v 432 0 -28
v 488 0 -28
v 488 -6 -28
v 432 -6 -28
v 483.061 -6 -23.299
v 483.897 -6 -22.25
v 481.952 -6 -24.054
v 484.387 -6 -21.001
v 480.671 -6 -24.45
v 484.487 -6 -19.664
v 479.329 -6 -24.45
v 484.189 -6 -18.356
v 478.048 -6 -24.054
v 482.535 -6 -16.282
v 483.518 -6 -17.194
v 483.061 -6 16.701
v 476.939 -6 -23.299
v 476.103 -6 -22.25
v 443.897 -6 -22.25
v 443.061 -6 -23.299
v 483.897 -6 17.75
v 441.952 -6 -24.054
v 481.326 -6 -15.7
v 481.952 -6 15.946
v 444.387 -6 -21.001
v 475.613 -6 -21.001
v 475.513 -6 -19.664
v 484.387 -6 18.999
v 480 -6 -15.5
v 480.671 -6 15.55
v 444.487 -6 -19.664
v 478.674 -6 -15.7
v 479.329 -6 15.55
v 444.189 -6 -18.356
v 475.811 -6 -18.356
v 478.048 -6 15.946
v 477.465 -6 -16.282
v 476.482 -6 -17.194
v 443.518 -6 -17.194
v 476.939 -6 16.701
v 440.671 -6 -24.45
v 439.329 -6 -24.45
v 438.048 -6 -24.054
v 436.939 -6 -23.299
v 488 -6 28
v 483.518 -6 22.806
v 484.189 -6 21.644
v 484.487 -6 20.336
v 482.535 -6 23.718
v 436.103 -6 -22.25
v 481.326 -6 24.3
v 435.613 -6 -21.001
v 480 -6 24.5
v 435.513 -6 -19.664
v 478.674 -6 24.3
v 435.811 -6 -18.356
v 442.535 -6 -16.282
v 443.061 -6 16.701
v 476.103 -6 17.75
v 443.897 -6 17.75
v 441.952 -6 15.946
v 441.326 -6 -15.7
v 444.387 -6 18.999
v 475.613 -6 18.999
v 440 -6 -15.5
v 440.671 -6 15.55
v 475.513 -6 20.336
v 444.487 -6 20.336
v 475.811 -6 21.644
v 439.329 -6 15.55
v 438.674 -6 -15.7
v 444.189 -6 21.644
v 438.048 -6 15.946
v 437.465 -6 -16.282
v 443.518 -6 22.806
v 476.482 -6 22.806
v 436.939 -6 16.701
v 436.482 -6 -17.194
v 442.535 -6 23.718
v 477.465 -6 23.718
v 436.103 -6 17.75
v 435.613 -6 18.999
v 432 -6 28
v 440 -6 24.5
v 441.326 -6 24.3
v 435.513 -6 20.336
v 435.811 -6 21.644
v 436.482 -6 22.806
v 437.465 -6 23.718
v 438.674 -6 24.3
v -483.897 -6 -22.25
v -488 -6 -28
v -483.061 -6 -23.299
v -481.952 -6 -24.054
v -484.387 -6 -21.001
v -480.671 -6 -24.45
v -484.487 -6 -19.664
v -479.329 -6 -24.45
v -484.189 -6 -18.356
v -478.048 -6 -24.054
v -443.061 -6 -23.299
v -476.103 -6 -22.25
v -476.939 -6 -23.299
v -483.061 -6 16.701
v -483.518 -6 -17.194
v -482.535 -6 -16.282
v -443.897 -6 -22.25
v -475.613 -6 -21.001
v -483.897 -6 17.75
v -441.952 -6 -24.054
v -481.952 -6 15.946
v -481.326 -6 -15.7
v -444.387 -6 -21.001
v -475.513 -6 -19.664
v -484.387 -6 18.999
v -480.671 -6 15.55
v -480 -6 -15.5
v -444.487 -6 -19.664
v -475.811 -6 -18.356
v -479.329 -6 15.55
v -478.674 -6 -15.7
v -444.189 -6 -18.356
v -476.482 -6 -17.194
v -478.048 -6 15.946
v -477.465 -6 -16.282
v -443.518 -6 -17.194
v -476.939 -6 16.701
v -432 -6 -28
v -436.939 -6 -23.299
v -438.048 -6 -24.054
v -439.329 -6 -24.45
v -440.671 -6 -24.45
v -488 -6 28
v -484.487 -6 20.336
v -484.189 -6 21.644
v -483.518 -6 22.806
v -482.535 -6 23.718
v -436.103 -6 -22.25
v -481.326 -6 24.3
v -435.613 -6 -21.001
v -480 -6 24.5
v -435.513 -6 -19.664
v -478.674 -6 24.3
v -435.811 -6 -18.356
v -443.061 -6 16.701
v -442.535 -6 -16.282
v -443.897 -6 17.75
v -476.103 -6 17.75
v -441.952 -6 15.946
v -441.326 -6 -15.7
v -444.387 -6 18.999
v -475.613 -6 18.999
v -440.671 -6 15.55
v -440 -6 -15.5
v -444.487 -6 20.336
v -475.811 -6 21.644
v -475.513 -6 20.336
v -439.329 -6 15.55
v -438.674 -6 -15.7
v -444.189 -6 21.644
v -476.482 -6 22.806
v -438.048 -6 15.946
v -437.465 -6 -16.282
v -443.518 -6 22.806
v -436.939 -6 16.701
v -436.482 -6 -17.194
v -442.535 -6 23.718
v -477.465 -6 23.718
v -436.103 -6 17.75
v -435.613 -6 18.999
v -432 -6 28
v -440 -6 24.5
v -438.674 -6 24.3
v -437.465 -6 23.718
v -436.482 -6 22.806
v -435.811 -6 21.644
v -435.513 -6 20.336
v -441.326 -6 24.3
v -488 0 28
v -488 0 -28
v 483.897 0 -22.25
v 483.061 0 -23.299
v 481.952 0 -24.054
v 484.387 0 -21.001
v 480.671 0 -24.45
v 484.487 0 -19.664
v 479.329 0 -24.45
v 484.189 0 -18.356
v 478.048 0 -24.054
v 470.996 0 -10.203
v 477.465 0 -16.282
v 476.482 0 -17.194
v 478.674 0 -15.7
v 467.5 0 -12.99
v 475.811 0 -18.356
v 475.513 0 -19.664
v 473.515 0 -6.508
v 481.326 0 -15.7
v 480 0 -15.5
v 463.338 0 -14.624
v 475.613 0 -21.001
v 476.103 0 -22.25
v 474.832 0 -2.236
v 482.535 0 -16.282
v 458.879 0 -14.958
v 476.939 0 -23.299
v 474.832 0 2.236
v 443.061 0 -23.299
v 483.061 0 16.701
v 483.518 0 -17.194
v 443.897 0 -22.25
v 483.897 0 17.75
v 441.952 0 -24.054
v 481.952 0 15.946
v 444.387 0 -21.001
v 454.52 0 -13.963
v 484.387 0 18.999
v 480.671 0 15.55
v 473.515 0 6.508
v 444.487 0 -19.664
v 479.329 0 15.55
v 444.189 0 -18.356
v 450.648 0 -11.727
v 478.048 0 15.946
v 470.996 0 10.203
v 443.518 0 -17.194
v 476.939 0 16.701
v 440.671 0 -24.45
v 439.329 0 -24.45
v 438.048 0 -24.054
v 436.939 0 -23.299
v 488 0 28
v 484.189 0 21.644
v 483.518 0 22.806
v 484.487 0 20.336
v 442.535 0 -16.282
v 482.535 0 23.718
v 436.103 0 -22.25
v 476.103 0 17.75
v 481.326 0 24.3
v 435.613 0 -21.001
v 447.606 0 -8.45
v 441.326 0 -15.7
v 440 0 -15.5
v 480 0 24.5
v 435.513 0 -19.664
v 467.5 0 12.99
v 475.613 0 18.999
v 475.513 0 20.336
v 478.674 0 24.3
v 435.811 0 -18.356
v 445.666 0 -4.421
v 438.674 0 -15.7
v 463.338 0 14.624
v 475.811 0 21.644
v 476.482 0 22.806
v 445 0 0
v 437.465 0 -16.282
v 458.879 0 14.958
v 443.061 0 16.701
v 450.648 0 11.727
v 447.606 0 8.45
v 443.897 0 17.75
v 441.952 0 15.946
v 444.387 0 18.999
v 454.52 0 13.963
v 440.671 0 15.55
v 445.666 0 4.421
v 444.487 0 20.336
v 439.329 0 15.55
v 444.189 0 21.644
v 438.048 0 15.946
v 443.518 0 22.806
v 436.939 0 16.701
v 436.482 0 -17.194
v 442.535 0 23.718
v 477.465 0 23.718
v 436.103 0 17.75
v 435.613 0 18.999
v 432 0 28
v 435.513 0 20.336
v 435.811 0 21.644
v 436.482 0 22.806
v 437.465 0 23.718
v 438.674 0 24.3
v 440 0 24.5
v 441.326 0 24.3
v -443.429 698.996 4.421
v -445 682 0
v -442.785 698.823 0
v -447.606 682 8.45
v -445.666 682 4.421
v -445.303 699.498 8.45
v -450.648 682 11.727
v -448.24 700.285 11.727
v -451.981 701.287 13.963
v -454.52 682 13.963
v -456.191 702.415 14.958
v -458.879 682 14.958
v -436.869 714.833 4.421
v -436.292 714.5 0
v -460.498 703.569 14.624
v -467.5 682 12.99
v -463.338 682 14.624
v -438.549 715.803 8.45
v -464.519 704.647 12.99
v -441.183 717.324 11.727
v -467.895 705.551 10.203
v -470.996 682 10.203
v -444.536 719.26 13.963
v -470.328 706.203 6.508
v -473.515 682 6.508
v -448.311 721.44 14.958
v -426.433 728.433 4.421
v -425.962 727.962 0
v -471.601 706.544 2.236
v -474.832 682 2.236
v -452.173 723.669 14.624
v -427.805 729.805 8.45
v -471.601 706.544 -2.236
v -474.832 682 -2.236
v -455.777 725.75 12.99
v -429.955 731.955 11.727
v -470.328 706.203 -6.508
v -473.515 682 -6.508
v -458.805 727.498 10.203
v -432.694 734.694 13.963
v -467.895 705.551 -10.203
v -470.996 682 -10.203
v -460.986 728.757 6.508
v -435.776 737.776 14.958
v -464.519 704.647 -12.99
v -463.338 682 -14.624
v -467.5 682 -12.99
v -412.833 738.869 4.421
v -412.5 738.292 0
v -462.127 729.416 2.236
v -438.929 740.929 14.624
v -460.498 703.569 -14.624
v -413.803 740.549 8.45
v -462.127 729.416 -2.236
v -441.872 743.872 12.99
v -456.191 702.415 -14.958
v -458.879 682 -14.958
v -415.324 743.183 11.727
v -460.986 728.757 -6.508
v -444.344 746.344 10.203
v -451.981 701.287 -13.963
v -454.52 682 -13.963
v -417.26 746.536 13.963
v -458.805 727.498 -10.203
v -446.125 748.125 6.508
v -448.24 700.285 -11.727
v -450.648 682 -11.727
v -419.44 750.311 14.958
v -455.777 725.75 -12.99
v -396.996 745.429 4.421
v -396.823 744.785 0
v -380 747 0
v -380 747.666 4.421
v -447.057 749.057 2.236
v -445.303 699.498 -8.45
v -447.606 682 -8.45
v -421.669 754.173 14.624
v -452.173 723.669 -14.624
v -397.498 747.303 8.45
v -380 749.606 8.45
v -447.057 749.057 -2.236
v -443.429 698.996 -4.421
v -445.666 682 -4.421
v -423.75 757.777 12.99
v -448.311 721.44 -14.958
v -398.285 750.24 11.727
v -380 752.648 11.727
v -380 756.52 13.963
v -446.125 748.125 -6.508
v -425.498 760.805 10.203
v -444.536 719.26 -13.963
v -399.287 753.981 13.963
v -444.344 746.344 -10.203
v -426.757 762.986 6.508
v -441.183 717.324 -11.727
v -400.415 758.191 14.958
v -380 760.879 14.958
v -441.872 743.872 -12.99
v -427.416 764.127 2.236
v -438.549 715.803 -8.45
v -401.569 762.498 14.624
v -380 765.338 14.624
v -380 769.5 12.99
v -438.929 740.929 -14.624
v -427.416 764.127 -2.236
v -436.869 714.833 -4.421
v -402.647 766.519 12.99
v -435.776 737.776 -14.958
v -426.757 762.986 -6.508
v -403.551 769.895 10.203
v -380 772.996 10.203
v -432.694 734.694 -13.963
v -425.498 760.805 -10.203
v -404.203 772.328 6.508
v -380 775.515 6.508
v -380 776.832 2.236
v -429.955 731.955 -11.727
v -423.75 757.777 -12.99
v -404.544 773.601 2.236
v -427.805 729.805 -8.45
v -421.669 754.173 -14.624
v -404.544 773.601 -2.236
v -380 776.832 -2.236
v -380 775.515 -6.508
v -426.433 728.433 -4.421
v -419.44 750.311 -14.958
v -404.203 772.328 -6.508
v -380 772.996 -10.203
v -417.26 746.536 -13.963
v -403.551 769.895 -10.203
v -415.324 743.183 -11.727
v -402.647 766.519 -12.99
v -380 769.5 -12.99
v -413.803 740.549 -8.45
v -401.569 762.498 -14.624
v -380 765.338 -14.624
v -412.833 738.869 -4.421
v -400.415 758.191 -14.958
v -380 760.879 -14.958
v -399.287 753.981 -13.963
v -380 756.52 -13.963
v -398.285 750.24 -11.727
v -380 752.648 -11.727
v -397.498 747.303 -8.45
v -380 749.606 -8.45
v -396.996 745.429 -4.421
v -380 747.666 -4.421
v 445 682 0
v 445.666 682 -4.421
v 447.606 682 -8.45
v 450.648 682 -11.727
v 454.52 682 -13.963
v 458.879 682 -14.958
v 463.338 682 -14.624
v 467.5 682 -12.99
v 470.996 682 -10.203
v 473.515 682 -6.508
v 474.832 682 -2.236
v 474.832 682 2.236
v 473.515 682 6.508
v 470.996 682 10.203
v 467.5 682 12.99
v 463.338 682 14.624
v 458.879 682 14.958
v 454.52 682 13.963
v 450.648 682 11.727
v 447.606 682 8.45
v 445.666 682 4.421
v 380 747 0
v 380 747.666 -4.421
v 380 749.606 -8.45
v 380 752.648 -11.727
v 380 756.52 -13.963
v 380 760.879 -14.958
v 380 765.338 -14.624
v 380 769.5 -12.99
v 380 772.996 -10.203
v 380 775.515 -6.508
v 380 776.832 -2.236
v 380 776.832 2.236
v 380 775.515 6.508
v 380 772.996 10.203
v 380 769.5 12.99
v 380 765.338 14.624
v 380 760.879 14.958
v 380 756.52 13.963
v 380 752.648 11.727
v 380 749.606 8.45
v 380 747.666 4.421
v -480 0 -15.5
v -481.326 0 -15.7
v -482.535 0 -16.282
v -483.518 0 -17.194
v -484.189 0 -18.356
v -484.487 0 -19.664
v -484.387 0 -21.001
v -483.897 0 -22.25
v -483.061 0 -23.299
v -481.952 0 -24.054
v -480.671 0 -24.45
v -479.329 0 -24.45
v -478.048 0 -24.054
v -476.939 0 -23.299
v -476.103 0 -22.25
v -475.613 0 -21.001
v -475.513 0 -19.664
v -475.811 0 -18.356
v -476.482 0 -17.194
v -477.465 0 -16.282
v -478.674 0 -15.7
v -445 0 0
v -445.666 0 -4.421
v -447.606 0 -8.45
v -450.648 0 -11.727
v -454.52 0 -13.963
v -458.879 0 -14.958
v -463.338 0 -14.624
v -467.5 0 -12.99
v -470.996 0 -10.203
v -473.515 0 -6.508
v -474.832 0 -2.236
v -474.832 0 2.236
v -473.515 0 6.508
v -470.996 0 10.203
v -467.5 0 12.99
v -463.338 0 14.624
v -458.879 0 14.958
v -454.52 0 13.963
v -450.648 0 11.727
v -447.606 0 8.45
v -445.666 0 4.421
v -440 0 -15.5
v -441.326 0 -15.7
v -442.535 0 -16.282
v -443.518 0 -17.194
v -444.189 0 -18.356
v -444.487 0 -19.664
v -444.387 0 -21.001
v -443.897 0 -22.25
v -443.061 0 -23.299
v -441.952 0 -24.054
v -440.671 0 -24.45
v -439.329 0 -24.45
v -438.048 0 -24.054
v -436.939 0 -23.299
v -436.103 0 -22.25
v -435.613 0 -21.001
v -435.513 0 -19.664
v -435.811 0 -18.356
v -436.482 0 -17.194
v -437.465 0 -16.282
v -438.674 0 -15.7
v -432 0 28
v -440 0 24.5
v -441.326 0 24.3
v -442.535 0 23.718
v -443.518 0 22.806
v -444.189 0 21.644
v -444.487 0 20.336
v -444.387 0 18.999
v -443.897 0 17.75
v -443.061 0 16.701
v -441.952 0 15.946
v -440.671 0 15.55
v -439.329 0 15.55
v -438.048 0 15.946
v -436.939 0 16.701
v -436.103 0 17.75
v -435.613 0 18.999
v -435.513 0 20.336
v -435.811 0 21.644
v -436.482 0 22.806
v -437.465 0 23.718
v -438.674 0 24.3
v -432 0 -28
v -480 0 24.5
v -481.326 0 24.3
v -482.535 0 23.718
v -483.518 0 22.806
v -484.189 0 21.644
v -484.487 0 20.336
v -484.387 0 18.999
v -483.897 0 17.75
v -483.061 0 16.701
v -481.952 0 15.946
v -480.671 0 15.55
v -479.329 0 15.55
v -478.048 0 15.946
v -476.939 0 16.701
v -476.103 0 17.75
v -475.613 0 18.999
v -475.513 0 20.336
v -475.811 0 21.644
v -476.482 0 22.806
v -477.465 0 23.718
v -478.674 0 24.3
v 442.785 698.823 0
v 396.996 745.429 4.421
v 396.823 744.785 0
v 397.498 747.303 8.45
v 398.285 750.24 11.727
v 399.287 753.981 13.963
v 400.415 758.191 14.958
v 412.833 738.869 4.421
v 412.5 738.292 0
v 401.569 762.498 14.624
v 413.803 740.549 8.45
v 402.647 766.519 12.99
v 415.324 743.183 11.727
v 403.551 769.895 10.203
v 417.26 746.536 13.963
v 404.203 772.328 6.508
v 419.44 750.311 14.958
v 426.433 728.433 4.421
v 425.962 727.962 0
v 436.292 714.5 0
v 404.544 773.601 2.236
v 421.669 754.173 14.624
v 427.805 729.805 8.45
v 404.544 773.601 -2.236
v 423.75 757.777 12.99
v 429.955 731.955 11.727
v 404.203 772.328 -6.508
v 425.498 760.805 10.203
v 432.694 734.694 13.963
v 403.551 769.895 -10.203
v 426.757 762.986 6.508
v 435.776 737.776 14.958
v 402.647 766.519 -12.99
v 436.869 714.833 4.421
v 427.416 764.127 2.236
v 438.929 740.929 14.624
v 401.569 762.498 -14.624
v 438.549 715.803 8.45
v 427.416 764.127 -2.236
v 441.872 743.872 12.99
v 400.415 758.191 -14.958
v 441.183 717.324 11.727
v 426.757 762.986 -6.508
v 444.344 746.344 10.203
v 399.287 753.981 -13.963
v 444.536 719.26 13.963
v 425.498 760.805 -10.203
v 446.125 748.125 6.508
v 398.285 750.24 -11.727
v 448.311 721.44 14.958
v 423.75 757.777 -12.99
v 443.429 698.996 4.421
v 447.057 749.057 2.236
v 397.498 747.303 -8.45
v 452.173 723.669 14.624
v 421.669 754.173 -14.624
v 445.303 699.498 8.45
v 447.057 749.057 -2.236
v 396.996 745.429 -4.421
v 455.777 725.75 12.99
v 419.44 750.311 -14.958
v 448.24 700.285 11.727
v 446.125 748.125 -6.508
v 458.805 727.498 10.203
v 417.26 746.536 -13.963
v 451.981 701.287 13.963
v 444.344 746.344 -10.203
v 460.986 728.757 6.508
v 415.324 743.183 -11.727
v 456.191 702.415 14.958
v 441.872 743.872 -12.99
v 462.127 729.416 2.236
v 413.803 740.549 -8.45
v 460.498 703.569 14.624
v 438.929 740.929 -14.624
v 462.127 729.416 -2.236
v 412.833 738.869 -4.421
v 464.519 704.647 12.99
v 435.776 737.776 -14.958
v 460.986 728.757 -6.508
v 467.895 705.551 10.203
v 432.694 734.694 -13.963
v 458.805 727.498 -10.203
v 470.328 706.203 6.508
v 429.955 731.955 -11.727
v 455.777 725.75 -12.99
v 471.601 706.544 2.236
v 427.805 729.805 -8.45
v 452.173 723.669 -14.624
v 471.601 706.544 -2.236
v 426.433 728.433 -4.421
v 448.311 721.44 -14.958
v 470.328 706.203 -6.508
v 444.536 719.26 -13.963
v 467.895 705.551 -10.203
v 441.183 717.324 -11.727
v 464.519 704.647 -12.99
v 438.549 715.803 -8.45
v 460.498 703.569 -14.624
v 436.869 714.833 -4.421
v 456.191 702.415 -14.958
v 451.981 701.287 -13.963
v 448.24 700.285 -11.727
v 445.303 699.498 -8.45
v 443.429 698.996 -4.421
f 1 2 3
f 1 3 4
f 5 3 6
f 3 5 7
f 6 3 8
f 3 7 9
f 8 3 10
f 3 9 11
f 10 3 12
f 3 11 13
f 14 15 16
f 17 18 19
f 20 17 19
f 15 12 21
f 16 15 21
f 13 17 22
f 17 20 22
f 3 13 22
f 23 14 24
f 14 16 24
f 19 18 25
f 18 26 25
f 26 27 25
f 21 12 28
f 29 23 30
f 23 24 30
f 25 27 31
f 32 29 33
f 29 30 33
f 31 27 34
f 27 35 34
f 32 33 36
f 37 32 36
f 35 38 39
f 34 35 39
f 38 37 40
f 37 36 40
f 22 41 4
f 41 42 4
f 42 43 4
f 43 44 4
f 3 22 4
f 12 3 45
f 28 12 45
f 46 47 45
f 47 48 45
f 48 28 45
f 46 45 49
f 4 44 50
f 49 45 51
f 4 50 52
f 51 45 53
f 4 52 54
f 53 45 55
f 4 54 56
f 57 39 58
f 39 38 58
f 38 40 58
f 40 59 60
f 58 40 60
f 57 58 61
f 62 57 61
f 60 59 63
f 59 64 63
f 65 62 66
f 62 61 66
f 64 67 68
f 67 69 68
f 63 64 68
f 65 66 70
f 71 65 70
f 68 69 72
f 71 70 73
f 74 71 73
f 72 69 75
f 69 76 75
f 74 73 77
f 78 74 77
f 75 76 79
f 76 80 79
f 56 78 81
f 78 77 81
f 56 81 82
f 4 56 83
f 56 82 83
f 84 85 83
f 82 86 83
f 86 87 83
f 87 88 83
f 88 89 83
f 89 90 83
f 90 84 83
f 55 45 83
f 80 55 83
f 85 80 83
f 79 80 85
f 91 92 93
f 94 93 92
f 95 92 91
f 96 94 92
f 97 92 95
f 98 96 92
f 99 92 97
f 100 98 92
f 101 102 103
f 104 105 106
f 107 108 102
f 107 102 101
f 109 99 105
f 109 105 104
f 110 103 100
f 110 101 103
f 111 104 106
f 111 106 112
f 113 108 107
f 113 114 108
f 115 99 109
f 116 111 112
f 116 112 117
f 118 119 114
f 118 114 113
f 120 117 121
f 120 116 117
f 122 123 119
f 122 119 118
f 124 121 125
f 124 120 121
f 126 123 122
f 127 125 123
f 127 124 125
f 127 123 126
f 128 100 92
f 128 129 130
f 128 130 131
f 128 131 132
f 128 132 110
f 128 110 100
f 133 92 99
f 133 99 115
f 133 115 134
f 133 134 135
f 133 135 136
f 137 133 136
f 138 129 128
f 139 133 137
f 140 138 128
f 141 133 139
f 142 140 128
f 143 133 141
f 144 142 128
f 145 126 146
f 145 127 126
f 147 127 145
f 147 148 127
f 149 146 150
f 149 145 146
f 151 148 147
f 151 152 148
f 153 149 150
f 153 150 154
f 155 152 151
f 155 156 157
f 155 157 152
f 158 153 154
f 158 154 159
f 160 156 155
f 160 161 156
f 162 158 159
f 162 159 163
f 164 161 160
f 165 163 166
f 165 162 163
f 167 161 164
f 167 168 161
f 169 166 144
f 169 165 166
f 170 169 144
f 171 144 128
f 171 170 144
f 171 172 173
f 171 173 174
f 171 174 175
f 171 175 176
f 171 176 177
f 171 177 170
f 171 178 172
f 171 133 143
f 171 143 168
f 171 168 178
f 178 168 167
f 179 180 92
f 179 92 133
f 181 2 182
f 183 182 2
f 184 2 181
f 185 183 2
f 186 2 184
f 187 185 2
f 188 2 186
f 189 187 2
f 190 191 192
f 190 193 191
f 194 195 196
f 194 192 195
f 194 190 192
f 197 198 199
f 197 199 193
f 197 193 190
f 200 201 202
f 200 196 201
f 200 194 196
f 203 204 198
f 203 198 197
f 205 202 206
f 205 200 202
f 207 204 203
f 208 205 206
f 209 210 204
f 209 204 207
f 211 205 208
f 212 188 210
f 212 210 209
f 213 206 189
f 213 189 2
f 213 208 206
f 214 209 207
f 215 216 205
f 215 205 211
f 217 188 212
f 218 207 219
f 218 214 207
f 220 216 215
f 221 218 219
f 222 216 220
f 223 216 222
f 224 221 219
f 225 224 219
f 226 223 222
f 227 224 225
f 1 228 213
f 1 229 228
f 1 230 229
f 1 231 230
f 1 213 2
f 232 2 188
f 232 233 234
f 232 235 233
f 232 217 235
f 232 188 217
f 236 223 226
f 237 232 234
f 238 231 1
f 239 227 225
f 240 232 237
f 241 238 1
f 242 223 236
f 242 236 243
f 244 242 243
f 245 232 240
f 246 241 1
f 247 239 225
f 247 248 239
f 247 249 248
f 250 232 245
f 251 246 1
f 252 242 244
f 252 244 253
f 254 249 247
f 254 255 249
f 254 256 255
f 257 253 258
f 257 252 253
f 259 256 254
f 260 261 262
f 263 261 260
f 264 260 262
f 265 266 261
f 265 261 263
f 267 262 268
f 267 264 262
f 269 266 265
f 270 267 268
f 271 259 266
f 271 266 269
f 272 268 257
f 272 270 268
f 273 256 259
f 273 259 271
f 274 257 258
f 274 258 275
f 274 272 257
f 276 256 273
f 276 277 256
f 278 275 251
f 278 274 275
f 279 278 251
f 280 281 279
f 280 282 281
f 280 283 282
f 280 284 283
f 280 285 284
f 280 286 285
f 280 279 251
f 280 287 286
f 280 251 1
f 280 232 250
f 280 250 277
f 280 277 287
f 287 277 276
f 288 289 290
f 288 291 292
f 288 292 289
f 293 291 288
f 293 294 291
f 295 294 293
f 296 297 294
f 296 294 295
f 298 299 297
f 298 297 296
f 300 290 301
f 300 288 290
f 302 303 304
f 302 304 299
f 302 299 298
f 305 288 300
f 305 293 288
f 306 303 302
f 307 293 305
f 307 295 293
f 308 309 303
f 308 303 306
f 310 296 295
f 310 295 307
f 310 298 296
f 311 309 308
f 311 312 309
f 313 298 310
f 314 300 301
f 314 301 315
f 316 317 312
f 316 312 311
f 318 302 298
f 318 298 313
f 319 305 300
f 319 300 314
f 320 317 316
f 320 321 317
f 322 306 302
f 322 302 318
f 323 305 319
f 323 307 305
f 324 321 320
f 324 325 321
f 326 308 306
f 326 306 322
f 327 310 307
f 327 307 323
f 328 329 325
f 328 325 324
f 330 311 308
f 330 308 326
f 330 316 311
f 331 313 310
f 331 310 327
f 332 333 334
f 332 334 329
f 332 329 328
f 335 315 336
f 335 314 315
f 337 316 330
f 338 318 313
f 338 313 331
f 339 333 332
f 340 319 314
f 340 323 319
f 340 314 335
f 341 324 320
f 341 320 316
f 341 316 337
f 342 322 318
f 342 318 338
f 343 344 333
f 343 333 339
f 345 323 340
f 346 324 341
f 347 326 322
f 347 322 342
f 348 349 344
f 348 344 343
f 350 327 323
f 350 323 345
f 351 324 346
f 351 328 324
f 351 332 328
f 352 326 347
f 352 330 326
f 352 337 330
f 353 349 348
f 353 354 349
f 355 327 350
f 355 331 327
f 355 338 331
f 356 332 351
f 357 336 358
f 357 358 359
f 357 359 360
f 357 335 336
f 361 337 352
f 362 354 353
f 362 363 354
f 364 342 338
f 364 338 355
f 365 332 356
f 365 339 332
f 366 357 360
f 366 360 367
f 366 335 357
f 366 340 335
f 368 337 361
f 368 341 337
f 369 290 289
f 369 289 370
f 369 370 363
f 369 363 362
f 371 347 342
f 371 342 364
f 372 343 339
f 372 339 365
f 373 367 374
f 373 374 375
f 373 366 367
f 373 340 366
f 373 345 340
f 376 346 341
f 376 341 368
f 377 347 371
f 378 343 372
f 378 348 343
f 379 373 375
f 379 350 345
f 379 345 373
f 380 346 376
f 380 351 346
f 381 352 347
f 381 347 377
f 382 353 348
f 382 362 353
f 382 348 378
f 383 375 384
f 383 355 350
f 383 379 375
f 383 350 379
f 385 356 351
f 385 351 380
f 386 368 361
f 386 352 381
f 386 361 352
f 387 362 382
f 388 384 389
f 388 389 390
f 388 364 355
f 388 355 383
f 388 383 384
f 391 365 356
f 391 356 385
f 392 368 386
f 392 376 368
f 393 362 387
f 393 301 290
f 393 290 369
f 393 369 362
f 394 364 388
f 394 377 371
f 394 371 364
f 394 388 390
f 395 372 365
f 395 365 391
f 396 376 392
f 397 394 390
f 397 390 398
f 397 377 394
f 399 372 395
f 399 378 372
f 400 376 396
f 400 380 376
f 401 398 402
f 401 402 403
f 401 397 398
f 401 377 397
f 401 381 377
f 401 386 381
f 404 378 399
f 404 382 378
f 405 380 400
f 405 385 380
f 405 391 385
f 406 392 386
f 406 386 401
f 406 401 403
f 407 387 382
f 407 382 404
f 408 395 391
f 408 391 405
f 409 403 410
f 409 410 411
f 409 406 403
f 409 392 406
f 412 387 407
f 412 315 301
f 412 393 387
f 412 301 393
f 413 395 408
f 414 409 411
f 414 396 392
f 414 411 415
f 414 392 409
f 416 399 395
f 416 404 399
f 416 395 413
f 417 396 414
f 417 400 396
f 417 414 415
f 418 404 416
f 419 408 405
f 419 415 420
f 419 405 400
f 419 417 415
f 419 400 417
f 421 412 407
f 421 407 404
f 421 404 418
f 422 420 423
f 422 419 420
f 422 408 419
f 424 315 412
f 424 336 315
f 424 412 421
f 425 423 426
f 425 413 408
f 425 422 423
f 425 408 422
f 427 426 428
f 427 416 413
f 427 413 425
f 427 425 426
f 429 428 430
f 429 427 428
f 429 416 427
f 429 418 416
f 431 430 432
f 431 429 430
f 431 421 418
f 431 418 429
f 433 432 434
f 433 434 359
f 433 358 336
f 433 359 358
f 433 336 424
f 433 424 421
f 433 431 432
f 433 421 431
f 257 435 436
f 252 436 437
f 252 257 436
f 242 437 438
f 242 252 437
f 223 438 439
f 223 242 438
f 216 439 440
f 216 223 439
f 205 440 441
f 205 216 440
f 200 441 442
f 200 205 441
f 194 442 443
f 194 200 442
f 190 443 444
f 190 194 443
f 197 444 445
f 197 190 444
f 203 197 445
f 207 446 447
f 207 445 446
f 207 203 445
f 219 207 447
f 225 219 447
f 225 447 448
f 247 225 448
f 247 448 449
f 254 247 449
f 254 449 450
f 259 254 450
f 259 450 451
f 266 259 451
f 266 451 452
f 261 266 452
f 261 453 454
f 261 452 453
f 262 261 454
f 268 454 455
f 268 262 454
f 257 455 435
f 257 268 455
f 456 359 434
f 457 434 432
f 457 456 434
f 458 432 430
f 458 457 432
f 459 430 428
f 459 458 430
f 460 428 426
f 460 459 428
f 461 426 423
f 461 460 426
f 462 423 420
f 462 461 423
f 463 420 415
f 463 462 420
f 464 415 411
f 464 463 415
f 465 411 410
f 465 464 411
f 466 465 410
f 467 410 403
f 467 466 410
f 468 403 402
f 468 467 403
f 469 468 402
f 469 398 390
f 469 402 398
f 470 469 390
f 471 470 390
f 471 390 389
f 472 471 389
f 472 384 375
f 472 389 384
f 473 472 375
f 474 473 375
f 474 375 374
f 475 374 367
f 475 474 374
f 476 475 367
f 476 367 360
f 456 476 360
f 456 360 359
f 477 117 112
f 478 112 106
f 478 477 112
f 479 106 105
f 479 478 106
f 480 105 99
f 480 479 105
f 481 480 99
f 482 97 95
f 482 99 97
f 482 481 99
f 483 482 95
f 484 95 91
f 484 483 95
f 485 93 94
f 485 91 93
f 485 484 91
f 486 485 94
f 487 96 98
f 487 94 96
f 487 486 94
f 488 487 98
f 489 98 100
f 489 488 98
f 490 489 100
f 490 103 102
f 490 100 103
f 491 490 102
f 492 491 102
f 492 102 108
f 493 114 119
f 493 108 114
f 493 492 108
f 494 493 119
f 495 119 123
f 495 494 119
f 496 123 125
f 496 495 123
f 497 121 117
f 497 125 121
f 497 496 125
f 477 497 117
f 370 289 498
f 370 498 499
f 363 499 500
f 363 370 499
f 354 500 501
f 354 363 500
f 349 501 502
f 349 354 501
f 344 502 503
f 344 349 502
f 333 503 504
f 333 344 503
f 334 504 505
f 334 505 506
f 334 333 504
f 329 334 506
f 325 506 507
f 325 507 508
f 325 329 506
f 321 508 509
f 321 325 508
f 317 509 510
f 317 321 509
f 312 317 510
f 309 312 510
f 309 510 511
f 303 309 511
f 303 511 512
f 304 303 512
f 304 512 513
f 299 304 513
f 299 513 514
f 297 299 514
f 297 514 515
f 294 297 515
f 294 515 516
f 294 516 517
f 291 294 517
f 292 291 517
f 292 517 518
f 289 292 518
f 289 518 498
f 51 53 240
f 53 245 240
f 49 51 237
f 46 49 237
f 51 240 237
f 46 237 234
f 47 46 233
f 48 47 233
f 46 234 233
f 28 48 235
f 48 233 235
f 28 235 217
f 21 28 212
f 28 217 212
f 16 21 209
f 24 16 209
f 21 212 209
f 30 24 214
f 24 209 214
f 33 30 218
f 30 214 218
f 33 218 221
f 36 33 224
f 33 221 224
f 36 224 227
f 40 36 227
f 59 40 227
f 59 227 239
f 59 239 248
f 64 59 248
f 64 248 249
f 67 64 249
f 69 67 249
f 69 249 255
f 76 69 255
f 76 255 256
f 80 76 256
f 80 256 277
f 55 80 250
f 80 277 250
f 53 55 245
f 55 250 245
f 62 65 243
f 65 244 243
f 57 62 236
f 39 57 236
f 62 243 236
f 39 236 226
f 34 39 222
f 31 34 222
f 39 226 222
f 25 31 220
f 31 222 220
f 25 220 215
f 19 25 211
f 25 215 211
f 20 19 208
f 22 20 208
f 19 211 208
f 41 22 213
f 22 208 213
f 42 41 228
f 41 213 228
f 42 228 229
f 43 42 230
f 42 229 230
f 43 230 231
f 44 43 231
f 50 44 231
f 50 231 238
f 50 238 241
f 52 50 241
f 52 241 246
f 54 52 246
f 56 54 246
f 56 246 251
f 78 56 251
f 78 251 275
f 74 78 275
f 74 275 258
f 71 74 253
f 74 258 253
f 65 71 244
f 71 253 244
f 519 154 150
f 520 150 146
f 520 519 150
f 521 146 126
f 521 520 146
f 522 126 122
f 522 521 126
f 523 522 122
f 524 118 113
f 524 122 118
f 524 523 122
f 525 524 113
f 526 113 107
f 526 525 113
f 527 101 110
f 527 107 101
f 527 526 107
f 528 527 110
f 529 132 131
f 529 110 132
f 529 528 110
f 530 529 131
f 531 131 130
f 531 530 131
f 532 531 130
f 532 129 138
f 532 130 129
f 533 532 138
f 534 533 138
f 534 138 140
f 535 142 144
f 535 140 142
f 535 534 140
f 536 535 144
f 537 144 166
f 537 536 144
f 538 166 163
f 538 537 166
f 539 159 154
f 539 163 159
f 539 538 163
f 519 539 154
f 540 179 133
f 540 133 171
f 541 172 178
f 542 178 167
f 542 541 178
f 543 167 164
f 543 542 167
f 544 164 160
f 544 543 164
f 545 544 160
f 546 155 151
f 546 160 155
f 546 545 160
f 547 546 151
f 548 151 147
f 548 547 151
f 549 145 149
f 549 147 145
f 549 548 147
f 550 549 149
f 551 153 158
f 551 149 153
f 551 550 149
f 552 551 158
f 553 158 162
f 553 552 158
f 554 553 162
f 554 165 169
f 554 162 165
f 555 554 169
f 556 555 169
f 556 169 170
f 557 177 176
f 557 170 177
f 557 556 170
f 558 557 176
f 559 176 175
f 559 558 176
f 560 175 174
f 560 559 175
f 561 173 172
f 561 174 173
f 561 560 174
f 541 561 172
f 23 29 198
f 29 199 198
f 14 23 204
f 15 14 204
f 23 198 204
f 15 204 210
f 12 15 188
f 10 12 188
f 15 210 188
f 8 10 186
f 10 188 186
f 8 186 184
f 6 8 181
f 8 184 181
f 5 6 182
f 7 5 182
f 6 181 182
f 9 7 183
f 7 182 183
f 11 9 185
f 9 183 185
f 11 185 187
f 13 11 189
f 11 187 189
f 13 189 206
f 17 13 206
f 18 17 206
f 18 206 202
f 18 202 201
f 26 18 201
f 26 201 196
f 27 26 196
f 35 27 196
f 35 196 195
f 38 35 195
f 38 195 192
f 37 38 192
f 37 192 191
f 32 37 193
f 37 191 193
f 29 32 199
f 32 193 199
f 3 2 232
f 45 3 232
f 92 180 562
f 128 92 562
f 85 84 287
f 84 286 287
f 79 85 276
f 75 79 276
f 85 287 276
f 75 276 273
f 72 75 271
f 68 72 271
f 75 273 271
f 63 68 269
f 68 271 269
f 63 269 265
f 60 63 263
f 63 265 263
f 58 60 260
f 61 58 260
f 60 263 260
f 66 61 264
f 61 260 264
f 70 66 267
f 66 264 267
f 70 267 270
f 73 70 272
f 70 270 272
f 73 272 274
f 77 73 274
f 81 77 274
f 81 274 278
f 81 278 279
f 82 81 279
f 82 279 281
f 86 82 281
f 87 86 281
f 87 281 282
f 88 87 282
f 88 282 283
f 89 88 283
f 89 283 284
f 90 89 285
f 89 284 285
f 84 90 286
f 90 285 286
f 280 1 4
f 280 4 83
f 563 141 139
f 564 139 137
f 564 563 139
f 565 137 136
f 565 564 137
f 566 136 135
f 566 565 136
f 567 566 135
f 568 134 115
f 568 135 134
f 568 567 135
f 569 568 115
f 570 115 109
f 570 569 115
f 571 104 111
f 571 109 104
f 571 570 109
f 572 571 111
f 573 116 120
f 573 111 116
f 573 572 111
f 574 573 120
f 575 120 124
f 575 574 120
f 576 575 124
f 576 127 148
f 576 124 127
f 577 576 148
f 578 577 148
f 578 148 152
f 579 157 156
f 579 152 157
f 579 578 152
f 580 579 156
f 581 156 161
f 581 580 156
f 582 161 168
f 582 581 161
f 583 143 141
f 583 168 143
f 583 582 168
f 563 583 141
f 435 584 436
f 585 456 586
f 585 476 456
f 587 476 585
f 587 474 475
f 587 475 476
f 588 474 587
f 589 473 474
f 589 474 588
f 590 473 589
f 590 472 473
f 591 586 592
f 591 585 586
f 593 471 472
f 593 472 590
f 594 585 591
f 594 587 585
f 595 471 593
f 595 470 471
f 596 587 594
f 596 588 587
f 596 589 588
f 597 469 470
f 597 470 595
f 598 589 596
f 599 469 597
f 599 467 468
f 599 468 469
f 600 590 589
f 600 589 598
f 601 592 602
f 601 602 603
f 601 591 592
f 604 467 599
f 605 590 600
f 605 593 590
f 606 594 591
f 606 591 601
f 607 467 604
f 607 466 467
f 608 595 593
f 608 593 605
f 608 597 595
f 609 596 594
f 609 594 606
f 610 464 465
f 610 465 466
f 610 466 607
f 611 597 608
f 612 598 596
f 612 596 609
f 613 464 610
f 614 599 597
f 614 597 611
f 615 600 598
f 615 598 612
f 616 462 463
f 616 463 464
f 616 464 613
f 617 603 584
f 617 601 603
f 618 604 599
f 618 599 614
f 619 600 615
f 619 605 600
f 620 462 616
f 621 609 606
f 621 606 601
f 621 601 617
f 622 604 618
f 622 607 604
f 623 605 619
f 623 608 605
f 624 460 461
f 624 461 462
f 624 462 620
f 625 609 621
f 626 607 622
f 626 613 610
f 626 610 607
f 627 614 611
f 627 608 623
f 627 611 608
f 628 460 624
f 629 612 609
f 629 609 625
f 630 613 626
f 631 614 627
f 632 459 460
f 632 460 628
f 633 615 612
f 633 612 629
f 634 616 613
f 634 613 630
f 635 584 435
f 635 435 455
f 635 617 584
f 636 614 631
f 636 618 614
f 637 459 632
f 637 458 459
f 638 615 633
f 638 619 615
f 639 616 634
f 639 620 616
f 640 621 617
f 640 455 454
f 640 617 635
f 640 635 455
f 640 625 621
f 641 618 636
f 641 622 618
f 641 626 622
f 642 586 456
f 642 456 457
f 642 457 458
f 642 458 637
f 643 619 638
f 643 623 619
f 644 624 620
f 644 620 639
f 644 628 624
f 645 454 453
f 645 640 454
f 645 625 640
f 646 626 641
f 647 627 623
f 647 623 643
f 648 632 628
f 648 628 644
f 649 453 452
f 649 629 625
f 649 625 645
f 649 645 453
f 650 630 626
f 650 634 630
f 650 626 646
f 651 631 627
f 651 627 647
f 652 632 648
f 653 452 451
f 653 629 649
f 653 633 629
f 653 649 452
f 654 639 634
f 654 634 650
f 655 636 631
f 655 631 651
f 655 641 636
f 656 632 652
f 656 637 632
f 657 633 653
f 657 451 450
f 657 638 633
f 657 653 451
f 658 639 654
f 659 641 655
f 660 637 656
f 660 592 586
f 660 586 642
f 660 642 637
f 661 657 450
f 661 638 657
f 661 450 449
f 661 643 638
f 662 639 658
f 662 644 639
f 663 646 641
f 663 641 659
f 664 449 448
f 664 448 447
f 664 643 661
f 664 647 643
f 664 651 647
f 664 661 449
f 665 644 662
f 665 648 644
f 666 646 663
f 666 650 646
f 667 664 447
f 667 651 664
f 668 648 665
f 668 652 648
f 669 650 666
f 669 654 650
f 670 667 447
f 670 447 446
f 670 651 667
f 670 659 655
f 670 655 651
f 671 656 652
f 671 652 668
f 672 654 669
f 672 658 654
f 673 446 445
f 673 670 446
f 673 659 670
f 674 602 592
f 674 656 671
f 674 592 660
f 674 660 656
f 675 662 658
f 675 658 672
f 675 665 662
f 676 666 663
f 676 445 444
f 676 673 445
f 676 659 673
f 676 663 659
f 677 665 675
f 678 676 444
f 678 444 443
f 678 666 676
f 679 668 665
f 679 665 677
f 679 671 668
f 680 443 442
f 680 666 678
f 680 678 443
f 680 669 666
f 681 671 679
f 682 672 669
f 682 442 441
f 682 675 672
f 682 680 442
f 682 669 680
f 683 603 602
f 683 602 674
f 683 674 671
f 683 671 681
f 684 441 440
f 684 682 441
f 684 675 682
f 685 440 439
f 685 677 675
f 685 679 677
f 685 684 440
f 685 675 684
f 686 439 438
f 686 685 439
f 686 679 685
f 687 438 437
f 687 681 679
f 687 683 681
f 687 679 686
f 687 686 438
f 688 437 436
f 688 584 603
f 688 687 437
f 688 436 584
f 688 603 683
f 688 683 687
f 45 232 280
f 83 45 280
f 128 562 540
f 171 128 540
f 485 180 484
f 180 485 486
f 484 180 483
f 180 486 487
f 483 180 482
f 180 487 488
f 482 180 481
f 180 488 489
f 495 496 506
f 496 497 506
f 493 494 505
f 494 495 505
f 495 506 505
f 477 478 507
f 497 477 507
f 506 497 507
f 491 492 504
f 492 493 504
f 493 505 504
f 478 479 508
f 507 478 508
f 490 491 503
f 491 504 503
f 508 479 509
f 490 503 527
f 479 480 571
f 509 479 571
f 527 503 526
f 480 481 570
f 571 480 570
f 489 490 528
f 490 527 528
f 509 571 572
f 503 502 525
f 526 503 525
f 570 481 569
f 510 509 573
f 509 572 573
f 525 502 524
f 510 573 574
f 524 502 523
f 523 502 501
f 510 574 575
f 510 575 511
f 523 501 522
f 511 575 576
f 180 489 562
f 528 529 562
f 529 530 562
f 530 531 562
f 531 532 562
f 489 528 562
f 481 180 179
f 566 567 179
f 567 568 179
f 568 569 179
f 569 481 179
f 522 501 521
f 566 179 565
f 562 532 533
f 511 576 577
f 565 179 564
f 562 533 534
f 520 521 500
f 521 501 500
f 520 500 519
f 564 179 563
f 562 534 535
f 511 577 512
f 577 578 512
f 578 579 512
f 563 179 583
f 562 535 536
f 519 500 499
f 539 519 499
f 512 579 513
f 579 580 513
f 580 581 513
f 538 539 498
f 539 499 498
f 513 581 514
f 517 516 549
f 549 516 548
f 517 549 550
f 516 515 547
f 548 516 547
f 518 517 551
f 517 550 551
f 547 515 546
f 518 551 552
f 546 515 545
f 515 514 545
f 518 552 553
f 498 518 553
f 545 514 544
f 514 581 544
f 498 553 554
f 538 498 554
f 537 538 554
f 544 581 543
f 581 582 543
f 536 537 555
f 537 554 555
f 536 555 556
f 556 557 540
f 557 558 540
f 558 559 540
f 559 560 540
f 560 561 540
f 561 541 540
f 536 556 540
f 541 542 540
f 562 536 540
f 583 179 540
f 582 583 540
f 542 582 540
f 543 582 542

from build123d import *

# Parameters (mm, degrees)
SKETCH2_R                     = 15
SKETCH3_W                     = 56
SKETCH3_H                     = 56
BOSS_EXTRUDE1_DEPTH           = 6
M8_CLEARANCE_HOLE1_AT_2_COUNT = 2
M8_CLEARANCE_HOLE1_AT_2_PITCH = 56.568542495
M8_CLEARANCE_HOLE1_AT_3_COUNT = 2
M8_CLEARANCE_HOLE1_AT_3_PITCH = 40
M8_CLEARANCE_HOLE1_AT_4_COUNT = 2
M8_CLEARANCE_HOLE1_AT_4_PITCH = 40


with BuildPart() as part:
    # Sweep1: sweep along a path in Sketch1
    with BuildLine(Plane.XY) as sweep1_path:
        Line((-460, 0), (-460, 682))
        ThreePointArc((-460, 682), (-436.568542495, 738.568542495), (-380, 762))
        Line((-380, 762), (380, 762))
        ThreePointArc((380, 762), (436.568542495, 738.568542495), (460, 682))
        Line((460, 682), (460, 0))
    # Sketch2 → Sweep1 (sweep)
    with BuildSketch(Plane(origin=(0, 0, 0), x_dir=(1, 0, 0), z_dir=(0, 1, 0))):
        with Locations((-460, 0)):
            Circle(SKETCH2_R)
    sweep(path=sweep1_path.line)

    # Sketch3 → Boss-Extrude1 (add)
    with BuildSketch(Plane.XZ):
        with Locations((-460, 0)):
            Rectangle(SKETCH3_W, SKETCH3_H)
    boss_extrude1 = extrude(amount=BOSS_EXTRUDE1_DEPTH)

    # Sketch7 → M8 Clearance Hole1 (revolve, cut)
    with BuildSketch(Plane(origin=(-440, 0, 20), x_dir=(0, 0, 1), z_dir=(1, 0, 0))):
        Polygon((0, 0), (0, 25.703872786), (4.5, 23), (4.5, 0), align=None)
    m8_clearance_hole1 = revolve(axis=Axis((-440, 6.35, 20), (0, -1, 0)), mode=Mode.SUBTRACT)

    # M8 Clearance Hole1 at 2: M8 Clearance Hole1 ×2
    with Locations(*[Vector(-0.7071067811865477, 0, -0.7071067811865474) * (i * M8_CLEARANCE_HOLE1_AT_2_PITCH) for i in range(1, M8_CLEARANCE_HOLE1_AT_2_COUNT)]):
        add(m8_clearance_hole1, mode=Mode.SUBTRACT)

    # M8 Clearance Hole1 at 3: M8 Clearance Hole1 ×2
    with Locations(*[(-i * M8_CLEARANCE_HOLE1_AT_3_PITCH, 0, 0) for i in range(1, M8_CLEARANCE_HOLE1_AT_3_COUNT)]):
        add(m8_clearance_hole1, mode=Mode.SUBTRACT)

    # M8 Clearance Hole1 at 4: M8 Clearance Hole1 ×2
    with Locations(*[(0, 0, -i * M8_CLEARANCE_HOLE1_AT_4_PITCH) for i in range(1, M8_CLEARANCE_HOLE1_AT_4_COUNT)]):
        add(m8_clearance_hole1, mode=Mode.SUBTRACT)

    # Mirror1: Boss-Extrude1, M8 Clearance Hole1 across plane
    add(boss_extrude1.mirror(Plane(origin=(0, 0, 0), x_dir=(0, 0, 1), z_dir=(1, 0, 0))))
    add(m8_clearance_hole1.mirror(Plane(origin=(0, 0, 0), x_dir=(0, 0, 1), z_dir=(1, 0, 0))), mode=Mode.SUBTRACT)

    # Mirror1 copy 1 sketch → Mirror1 copy 1 (revolve, cut)
    with BuildSketch(Plane(origin=(480, 0, -20), x_dir=(0, 0, 1), z_dir=(-1, 0, 0))):
        Polygon((0, 0), (0, -25.703872786), (4.5, -23), (4.5, 0), align=None)
    revolve(axis=Axis((480, 6.35, -20), (0, 1, 0)), mode=Mode.SUBTRACT)

    # Mirror1 copy 2 sketch → Mirror1 copy 2 (revolve, cut)
    with BuildSketch(Plane(origin=(480, 0, 20), x_dir=(0, 0, 1), z_dir=(-1, 0, 0))):
        Polygon((0, 0), (0, -25.703872786), (4.5, -23), (4.5, 0), align=None)
    revolve(axis=Axis((480, 6.35, 20), (0, 1, 0)), mode=Mode.SUBTRACT)

    # Mirror1 copy 3 sketch → Mirror1 copy 3 (revolve, cut)
    with BuildSketch(Plane(origin=(440, 0, -20), x_dir=(0, 0, 1), z_dir=(-1, 0, 0))):
        Polygon((0, 0), (0, -25.703872786), (4.5, -23), (4.5, 0), align=None)
    revolve(axis=Axis((440, 6.35, -20), (0, 1, 0)), mode=Mode.SUBTRACT)


solid = part.part
